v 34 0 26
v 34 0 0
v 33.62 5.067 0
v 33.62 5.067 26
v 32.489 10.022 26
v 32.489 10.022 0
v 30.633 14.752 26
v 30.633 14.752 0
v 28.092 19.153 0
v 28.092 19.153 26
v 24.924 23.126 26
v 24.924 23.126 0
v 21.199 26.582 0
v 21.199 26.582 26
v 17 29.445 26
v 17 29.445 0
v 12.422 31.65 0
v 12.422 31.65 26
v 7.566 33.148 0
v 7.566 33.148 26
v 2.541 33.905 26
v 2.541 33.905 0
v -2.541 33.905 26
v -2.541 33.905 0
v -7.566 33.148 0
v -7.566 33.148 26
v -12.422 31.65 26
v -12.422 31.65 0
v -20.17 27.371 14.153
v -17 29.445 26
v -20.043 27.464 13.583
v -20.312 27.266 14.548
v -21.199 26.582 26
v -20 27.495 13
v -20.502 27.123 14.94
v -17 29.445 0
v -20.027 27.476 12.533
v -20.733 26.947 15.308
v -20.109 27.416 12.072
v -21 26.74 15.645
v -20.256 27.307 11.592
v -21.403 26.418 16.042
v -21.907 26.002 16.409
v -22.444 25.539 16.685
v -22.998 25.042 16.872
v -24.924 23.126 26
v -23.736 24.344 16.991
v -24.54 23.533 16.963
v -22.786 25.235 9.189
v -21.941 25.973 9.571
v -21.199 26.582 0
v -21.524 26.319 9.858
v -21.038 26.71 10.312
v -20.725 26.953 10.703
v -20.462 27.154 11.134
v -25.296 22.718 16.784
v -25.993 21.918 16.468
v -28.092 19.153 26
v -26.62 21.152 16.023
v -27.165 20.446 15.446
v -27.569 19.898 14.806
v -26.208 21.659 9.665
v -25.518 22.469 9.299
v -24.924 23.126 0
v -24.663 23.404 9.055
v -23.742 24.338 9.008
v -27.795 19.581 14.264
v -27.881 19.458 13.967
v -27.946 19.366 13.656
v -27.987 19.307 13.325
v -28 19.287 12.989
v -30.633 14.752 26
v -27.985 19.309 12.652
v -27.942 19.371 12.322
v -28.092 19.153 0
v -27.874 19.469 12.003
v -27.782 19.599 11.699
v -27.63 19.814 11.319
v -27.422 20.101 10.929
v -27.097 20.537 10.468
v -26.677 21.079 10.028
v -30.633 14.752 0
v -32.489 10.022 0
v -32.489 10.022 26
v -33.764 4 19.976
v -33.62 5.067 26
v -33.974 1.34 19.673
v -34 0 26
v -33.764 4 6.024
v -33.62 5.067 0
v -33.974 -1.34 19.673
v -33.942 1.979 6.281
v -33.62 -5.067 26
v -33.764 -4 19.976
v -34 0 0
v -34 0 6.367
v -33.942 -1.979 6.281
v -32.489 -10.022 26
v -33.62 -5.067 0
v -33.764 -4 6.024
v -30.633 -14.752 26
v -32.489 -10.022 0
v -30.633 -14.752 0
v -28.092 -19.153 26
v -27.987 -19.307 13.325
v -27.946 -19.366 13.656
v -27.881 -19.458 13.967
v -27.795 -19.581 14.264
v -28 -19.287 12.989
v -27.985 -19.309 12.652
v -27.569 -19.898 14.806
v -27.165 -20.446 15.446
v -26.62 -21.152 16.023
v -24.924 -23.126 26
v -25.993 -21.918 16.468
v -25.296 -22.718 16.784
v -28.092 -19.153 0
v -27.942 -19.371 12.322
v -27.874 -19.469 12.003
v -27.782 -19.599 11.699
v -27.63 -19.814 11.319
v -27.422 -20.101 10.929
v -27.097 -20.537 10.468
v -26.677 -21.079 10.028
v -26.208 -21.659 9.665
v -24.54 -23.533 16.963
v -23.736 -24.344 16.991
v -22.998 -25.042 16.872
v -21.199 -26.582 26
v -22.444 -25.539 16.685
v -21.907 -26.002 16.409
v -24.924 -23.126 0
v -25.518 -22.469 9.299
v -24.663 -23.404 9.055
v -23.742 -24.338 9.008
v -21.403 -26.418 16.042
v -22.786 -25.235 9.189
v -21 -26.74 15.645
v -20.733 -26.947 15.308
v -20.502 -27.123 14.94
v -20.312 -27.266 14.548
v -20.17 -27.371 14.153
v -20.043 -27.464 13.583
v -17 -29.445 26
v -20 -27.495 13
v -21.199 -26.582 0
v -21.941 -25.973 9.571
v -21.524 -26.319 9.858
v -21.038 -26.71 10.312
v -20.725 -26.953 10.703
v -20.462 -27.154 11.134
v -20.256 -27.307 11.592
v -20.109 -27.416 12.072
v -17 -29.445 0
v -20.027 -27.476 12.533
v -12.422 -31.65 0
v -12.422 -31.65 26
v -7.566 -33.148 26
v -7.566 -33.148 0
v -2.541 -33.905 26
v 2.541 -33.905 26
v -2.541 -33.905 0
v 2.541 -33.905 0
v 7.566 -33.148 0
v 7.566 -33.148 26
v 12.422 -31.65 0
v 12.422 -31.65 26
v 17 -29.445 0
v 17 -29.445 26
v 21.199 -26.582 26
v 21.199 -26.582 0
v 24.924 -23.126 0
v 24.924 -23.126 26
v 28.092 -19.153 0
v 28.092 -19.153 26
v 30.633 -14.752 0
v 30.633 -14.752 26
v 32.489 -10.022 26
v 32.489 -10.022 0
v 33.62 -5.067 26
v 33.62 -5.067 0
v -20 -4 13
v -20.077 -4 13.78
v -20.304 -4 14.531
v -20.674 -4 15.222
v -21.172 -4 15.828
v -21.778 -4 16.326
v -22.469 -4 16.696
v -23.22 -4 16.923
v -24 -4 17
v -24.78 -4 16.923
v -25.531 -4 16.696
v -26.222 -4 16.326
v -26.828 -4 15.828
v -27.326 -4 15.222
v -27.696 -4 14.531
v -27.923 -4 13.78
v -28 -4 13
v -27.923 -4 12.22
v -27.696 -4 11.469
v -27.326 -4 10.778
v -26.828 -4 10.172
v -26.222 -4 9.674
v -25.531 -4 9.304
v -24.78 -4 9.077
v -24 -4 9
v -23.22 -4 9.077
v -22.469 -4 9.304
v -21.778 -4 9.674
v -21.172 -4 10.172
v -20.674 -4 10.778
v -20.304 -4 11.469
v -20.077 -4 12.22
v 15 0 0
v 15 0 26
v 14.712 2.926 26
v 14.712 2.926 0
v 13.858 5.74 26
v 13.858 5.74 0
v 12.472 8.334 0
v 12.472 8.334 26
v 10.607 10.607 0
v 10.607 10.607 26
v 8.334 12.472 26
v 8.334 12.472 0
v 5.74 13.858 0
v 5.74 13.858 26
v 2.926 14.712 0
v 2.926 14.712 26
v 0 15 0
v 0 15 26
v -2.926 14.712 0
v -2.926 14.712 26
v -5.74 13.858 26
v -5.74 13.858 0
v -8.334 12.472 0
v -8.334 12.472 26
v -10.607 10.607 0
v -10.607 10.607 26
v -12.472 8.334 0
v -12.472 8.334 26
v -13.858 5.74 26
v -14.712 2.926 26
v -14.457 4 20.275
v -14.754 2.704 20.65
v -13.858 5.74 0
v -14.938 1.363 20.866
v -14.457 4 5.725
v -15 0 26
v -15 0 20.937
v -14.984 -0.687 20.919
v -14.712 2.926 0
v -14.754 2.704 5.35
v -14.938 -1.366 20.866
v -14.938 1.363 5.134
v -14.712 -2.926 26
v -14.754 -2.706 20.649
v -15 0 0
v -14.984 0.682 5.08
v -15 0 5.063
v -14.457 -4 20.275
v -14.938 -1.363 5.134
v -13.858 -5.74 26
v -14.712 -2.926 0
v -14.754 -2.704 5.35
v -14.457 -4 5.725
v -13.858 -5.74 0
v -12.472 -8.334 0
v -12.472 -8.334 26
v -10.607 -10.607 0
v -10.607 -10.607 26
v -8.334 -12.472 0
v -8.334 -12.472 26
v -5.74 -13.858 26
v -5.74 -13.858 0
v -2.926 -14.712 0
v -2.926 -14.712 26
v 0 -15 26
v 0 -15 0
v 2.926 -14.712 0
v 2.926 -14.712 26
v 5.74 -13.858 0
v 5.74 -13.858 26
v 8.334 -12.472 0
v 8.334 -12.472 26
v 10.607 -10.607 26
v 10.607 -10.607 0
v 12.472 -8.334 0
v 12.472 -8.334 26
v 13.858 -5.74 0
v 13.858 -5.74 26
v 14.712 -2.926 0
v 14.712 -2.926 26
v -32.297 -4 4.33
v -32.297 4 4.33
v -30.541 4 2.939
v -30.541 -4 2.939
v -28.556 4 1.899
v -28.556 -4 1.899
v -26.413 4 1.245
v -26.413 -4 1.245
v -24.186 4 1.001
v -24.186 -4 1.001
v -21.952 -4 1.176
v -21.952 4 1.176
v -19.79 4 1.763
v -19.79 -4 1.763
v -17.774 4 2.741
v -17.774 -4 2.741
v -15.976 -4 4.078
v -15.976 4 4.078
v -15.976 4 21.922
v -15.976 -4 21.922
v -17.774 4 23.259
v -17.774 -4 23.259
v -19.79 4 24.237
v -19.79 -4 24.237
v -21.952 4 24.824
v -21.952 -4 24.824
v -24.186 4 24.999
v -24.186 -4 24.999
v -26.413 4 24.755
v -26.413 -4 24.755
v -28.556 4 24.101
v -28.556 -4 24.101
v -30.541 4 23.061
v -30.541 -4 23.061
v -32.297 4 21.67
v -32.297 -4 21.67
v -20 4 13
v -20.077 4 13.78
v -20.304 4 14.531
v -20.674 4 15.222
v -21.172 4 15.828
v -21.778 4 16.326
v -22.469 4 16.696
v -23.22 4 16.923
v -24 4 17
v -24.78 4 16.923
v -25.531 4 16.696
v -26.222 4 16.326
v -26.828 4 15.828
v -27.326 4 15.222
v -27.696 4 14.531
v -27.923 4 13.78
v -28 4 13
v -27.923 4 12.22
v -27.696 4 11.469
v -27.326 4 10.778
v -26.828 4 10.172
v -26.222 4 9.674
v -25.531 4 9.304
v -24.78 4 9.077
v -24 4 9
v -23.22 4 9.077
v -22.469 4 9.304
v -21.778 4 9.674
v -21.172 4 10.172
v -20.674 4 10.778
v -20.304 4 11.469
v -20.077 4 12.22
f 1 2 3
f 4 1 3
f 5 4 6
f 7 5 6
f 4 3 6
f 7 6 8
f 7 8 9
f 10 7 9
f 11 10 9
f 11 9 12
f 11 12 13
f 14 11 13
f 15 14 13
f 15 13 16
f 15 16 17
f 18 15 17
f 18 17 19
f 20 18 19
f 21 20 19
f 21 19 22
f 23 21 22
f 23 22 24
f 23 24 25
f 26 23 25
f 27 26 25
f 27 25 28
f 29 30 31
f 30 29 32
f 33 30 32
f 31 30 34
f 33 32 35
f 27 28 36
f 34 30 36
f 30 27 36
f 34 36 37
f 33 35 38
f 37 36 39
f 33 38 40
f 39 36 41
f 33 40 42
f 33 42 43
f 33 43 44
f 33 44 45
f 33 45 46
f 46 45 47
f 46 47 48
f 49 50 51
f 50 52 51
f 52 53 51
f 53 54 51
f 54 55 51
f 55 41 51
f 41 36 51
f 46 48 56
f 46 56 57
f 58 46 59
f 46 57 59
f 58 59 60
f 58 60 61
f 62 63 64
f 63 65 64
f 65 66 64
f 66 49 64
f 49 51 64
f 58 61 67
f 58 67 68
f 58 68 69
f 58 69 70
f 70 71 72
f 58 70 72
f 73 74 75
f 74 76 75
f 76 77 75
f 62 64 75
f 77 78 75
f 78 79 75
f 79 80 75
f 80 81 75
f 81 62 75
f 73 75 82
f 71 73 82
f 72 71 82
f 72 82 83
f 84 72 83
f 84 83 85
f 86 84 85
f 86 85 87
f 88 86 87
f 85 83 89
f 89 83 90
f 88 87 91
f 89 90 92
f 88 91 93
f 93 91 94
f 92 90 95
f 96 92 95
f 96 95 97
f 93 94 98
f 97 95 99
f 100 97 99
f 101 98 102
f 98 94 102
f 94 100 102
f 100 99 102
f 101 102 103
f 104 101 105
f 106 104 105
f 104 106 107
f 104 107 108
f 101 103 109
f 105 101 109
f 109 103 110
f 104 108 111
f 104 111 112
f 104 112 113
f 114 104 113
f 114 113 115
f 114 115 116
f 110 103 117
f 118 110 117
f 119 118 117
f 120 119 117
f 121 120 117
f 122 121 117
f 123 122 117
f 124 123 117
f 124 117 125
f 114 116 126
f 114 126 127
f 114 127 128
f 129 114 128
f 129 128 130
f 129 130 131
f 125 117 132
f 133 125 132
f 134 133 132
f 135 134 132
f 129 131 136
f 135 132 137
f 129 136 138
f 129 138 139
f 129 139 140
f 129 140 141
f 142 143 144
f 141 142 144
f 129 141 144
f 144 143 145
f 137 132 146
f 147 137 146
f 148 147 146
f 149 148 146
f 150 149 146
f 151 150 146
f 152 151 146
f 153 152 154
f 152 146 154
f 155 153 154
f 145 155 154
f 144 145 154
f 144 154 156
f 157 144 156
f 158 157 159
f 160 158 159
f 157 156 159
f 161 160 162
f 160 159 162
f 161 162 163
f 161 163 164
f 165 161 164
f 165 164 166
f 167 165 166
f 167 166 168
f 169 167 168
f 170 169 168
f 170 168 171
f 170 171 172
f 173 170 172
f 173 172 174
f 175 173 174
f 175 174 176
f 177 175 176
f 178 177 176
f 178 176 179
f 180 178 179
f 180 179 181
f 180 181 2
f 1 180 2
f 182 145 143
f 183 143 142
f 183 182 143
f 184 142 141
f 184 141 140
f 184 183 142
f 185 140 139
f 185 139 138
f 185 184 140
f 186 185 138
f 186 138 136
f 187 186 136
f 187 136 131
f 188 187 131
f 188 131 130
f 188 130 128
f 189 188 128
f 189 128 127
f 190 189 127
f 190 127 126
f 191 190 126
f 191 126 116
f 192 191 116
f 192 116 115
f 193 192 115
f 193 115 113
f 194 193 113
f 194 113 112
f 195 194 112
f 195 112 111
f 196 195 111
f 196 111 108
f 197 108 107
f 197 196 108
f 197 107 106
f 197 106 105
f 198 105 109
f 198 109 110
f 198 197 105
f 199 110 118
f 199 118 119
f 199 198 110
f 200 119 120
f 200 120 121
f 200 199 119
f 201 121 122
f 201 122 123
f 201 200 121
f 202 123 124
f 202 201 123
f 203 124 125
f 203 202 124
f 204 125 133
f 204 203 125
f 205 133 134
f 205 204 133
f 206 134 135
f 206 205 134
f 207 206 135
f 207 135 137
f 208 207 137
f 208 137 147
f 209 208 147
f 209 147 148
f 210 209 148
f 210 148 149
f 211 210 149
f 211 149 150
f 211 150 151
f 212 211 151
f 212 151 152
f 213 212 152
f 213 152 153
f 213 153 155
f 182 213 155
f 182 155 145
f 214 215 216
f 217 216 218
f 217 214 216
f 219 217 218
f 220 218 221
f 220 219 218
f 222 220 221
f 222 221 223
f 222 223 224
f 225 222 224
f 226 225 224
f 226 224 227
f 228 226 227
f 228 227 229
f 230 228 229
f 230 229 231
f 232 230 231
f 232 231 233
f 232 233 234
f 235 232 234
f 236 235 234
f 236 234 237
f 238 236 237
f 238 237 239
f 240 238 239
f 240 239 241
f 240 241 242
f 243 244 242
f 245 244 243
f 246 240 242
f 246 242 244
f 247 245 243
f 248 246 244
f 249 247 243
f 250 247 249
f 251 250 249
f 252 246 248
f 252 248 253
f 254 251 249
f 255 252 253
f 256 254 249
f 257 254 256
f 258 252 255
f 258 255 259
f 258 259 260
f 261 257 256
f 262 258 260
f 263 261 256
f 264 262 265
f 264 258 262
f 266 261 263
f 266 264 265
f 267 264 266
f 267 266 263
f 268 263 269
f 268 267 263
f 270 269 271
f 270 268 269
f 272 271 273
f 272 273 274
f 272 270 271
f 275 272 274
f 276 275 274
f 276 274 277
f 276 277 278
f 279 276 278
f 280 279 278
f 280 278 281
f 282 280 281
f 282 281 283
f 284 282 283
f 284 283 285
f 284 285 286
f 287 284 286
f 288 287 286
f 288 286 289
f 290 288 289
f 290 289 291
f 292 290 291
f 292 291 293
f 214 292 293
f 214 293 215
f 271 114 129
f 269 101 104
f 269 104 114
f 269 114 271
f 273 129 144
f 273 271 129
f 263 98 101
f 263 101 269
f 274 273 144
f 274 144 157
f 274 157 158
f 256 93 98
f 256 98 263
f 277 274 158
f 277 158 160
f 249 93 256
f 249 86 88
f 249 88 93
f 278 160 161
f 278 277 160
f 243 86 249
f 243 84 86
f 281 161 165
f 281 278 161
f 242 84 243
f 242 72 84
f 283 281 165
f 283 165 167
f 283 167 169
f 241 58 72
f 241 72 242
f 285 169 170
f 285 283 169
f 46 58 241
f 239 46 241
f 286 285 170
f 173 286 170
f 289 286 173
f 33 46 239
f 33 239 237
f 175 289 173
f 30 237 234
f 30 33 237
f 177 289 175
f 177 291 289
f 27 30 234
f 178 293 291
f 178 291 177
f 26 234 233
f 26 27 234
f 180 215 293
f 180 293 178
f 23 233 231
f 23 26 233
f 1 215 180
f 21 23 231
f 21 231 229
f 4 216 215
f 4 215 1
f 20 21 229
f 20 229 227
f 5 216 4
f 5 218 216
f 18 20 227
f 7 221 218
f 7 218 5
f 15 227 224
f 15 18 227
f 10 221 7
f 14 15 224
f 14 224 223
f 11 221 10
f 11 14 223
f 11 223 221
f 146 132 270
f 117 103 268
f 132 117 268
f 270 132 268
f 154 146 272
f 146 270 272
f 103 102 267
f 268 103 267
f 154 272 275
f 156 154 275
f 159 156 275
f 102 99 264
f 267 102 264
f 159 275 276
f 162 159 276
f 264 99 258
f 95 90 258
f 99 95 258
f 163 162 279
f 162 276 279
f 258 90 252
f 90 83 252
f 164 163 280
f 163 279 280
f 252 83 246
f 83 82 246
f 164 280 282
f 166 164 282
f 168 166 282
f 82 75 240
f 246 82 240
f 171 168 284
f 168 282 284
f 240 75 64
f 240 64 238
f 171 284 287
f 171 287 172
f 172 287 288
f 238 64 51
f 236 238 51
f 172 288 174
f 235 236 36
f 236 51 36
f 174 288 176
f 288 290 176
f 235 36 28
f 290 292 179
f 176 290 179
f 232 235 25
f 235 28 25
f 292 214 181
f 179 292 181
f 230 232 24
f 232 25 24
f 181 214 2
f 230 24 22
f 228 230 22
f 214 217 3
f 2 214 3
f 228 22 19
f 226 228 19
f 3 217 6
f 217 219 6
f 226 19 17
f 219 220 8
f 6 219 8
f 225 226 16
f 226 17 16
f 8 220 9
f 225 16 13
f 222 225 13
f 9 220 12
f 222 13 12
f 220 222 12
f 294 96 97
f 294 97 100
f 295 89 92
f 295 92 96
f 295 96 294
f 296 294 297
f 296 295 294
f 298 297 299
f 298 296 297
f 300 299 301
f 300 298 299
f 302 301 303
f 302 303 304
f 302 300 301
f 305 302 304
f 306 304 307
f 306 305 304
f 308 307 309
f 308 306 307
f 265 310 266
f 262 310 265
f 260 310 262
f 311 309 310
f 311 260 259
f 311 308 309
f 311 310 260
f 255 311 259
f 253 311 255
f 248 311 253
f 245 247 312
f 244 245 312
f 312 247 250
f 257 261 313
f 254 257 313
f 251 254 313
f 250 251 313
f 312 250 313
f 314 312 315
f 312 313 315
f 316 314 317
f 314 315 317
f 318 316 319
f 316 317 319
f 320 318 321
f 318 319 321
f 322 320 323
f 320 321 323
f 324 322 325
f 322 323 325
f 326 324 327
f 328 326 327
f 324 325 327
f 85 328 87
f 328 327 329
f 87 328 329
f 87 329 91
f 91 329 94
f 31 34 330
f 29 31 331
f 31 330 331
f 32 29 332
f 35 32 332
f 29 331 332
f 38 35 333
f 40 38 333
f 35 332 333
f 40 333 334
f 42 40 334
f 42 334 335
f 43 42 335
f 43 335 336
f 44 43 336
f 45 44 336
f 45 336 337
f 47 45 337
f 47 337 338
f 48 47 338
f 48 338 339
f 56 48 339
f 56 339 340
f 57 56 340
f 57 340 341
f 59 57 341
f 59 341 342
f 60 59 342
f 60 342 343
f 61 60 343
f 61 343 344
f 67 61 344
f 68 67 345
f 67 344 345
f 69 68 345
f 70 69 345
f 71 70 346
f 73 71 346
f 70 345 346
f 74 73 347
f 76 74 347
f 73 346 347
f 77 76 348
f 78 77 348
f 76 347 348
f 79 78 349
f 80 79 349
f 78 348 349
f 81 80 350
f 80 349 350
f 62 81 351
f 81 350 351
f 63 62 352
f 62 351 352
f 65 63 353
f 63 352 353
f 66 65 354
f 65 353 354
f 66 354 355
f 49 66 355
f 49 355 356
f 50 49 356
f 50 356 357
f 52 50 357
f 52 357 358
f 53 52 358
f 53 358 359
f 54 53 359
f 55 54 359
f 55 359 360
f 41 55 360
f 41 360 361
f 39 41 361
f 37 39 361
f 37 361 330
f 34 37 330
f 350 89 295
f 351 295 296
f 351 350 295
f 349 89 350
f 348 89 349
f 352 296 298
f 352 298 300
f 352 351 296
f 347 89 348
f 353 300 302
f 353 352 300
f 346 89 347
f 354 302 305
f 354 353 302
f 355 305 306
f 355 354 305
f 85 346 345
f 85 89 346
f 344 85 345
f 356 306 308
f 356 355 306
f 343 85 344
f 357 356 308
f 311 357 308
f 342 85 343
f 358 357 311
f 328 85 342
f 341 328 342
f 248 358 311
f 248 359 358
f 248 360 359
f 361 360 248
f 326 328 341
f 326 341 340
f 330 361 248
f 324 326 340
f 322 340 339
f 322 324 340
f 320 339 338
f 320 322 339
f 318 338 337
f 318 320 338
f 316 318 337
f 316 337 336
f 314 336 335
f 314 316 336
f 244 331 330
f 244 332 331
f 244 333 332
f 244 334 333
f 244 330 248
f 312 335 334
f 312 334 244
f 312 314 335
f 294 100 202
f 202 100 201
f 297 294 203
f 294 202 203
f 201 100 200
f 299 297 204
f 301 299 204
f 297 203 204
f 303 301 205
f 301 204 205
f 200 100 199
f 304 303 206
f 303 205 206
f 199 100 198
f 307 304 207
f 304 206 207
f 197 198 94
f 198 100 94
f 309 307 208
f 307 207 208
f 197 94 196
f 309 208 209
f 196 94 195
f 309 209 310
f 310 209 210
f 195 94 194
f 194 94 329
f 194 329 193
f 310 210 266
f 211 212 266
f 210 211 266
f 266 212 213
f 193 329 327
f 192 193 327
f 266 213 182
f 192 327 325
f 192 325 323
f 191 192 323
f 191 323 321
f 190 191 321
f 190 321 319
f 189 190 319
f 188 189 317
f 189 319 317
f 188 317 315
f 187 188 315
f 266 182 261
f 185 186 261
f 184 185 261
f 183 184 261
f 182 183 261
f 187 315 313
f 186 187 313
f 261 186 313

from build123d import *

# Parameters (mm, degrees)
F0_R          = 34
F0_R_2        = 15
F1_DEPTH      = 26
F2_R          = 12
F3_DEPTH      = 4
F3_DEPTH_BACK = 4
F4_R          = 4
F5_DEPTH      = 34.0010001
F5_DEPTH_BACK = 34.0010001


with BuildPart() as f1:
    # F0 (on Top) → F1 (new body)
    with BuildSketch(Plane.XY):
        Circle(F0_R)
        Circle(F0_R_2, mode=Mode.SUBTRACT)
    extrude(amount=F1_DEPTH)

    # F2 (on Front) → F3 (cut, two sides)
    with BuildSketch(Plane.XZ) as f3_sk:
        with Locations((-24, 13)):
            Circle(F2_R)
    extrude(amount=-F3_DEPTH, mode=Mode.SUBTRACT)
    extrude(f3_sk.sketch, amount=F3_DEPTH_BACK, mode=Mode.SUBTRACT)

    # F4 (on Front) → F5 (cut, two sides)
    with BuildSketch(Plane.XZ) as f5_sk:
        with Locations((-24, 13)):
            Circle(F4_R)
    extrude(amount=F5_DEPTH, mode=Mode.SUBTRACT)
    extrude(f5_sk.sketch, amount=-F5_DEPTH_BACK, mode=Mode.SUBTRACT)


solid = f1.part
